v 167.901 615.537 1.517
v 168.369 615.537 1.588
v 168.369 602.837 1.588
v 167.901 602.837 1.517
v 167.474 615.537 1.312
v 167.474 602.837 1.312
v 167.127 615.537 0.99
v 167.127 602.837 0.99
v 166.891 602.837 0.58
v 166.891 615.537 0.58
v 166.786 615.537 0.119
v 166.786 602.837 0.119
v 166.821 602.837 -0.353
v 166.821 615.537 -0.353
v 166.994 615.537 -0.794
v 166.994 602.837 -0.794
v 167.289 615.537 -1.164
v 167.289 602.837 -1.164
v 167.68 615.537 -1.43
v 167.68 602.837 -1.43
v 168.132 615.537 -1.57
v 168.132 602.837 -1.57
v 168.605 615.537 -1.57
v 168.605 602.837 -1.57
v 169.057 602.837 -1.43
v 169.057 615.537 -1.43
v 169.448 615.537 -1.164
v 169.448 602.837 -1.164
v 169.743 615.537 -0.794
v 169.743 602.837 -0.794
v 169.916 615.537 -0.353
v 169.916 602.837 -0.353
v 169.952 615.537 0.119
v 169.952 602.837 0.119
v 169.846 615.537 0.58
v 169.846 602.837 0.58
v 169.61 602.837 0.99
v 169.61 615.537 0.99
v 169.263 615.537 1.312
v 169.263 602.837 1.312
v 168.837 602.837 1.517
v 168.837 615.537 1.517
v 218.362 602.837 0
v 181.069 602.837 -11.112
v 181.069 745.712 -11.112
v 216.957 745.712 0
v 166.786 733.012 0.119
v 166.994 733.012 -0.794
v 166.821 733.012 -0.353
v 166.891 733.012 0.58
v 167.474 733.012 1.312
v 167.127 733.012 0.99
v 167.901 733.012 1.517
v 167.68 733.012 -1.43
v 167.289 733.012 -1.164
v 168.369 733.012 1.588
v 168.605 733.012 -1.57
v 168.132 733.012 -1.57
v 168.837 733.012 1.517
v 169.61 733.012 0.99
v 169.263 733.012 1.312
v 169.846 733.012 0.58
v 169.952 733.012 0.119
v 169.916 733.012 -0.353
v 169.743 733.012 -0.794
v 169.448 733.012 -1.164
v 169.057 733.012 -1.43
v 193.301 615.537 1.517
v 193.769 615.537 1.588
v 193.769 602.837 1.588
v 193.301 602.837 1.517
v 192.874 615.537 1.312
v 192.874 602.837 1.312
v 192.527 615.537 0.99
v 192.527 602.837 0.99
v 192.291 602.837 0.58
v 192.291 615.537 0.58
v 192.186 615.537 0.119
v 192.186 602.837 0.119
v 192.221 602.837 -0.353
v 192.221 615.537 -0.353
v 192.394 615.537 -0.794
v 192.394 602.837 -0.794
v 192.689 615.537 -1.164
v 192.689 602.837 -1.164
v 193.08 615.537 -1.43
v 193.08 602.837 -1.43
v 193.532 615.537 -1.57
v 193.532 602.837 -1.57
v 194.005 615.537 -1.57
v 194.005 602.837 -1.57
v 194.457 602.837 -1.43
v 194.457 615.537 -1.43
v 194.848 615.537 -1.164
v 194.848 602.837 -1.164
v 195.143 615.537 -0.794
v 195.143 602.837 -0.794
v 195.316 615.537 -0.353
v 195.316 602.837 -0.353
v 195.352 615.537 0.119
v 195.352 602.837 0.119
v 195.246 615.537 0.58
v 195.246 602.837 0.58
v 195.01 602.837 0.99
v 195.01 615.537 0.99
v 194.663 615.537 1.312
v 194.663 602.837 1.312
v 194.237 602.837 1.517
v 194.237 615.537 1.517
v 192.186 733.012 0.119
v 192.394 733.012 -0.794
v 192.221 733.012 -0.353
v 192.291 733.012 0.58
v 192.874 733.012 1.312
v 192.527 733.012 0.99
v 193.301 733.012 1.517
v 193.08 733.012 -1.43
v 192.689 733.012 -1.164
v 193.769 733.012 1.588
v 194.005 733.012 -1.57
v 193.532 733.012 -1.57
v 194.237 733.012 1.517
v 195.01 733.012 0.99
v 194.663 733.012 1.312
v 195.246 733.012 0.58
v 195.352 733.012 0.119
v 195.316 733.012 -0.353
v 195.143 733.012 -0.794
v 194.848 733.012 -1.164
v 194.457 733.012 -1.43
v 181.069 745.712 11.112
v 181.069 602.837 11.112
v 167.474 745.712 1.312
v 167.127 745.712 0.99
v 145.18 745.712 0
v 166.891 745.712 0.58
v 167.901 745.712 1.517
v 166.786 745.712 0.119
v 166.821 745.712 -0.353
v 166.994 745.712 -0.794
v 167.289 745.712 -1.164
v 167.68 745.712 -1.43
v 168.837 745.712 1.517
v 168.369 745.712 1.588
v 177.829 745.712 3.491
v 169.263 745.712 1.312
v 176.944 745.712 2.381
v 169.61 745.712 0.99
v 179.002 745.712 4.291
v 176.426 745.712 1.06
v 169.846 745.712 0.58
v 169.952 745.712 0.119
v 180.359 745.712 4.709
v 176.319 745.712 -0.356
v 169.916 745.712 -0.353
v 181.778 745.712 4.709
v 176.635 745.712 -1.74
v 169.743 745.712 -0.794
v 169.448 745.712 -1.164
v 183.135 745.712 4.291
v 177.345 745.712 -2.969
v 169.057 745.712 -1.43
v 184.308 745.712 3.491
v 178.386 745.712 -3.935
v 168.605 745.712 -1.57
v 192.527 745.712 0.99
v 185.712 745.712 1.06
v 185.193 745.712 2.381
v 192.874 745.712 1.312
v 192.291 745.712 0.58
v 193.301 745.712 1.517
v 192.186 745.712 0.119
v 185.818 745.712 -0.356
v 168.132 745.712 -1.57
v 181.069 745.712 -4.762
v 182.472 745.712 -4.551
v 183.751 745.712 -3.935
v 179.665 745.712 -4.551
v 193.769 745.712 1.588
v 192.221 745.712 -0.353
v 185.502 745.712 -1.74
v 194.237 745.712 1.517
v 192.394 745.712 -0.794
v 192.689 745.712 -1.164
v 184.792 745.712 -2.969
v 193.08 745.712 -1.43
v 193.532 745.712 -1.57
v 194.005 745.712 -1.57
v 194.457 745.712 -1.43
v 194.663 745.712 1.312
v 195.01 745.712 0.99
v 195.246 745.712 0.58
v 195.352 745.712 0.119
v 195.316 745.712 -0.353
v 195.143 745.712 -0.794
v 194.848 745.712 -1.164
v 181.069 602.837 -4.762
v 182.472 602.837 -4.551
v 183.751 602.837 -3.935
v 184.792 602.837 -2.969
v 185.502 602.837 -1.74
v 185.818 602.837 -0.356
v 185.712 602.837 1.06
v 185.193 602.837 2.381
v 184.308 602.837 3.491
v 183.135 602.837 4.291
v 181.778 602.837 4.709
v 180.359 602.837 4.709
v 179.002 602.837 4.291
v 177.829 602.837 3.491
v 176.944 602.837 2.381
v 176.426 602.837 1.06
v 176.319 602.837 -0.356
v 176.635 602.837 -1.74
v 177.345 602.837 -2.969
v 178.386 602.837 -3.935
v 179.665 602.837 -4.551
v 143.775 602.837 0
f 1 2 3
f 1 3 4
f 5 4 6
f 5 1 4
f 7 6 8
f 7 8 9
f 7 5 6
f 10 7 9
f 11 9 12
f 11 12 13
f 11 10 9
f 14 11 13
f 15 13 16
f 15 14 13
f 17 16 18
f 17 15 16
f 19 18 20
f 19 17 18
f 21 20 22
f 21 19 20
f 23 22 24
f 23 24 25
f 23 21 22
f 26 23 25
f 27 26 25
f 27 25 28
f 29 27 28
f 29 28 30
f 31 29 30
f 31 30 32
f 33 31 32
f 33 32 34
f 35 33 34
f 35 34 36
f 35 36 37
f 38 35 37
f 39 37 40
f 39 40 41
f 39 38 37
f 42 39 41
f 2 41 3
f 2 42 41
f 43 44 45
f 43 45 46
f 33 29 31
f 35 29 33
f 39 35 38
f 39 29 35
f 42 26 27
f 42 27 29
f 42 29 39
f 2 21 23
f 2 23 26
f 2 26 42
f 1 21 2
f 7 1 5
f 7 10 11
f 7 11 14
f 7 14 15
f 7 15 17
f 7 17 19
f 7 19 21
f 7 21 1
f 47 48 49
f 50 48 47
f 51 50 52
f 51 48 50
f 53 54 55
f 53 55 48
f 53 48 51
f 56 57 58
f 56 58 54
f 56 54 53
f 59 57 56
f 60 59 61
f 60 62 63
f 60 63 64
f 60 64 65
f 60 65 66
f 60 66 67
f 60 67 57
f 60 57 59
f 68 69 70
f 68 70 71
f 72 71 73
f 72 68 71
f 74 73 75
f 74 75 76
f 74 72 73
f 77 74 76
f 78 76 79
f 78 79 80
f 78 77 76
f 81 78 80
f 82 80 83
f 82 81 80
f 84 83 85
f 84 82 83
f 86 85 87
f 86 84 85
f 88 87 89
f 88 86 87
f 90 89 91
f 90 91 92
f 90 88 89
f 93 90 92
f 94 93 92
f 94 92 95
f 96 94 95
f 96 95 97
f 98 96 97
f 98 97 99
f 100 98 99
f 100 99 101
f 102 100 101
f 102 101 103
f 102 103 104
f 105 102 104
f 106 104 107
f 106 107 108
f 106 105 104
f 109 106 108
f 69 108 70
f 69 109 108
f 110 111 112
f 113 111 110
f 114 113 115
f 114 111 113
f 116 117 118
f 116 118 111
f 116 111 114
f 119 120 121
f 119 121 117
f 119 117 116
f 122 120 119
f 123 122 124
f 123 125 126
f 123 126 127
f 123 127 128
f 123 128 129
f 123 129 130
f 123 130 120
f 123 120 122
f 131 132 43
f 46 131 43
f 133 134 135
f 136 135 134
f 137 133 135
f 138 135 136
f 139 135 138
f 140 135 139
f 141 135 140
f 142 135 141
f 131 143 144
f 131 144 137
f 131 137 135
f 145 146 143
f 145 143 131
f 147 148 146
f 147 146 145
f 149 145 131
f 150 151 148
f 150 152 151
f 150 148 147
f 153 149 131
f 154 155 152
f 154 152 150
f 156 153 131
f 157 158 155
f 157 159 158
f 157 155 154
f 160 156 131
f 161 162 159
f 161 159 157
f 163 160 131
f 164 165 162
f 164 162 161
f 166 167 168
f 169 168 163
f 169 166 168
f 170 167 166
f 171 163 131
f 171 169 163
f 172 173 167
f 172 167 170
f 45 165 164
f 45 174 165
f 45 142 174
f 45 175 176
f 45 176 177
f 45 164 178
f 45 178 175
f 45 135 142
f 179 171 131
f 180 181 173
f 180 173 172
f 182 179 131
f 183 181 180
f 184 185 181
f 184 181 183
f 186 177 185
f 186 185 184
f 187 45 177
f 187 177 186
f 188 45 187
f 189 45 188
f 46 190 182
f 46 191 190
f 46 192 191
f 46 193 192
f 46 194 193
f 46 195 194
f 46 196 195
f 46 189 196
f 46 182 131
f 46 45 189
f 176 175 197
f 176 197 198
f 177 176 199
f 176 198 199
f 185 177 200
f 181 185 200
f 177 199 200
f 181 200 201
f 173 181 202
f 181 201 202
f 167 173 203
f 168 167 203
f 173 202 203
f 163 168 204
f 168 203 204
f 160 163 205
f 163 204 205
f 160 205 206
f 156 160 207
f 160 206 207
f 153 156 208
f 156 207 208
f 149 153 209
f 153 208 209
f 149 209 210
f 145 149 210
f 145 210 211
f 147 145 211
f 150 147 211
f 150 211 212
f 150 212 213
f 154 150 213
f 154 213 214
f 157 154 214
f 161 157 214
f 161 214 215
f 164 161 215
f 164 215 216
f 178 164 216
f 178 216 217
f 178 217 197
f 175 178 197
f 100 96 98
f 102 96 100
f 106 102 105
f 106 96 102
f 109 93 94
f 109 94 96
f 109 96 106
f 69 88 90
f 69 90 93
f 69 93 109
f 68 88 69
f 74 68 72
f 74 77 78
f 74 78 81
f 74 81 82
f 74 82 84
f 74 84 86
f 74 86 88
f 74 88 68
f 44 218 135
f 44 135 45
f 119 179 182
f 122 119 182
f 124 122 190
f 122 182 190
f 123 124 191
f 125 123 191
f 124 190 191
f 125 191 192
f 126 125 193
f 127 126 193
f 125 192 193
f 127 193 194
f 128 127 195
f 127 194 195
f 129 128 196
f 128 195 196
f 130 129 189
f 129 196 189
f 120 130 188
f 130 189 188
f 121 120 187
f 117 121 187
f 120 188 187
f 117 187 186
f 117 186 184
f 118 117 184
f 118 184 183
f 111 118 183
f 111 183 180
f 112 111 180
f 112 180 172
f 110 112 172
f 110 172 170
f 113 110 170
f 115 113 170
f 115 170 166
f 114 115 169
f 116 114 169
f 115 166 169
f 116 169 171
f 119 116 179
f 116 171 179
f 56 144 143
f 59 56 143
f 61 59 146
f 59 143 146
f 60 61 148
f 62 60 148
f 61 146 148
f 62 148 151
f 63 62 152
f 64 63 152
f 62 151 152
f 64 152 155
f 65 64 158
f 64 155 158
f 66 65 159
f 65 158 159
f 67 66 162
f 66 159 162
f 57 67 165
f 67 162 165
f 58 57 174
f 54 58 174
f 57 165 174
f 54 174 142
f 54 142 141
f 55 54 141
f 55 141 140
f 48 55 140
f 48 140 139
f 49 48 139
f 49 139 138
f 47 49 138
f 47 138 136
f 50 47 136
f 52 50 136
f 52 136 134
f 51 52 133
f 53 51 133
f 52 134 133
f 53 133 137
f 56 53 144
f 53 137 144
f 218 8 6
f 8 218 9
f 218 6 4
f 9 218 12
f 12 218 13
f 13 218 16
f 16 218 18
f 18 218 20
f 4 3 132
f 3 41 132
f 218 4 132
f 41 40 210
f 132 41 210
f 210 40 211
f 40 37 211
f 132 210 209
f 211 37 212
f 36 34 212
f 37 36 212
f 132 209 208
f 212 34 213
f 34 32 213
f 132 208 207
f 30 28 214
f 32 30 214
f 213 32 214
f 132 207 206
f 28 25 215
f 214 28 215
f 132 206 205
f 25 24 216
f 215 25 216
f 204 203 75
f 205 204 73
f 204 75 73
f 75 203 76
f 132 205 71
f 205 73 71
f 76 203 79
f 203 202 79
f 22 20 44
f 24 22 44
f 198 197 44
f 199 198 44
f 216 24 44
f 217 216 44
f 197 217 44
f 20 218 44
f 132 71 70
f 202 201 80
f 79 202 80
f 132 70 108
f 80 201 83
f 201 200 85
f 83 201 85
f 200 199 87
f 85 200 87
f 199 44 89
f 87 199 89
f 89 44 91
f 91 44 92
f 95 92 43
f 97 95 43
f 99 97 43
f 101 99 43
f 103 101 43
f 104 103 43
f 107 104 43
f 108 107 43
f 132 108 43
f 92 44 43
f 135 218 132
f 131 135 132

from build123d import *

# Parameters (mm, degrees)
BOSS_EXTRUDE1_DEPTH      = 11.1125
BOSS_EXTRUDE1_DEPTH_BACK = 11.1125
SKETCH5_W                = 109.877468776
SKETCH5_H                = 283.051122129
CUT_EXTRUDE2_DEPTH       = 1193.492852366
SKETCH6_W                = 149.121482991
SKETCH6_H                = 108.921761737
CUT_EXTRUDE3_DEPTH       = 1175.662940665
SKETCH7_R                = 4.7625
CUT_EXTRUDE4_DEPTH       = 635
CUT_EXTRUDE8_DEPTH       = 1195.766301895
CUT_EXTRUDE8_DEPTH_BACK  = 1195.766301895
SKETCH8_W                = 149.774750394
SKETCH8_H                = 148.832770831
SKETCH8_H_2              = 142.875
SKETCH8_H_3              = 176.125878949
SKETCH11_R               = 1.5875
CUT_EXTRUDE9_DEPTH       = 12.7
CUT_EXTRUDE10_START      = -12.7
SKETCH12_R               = 1.5875
CUT_EXTRUDE10_DEPTH      = 12.7


with BuildPart() as part:
    # Sketch1 → Boss-Extrude1 (new, two sides: drawn at the far end of the back side and taken through both)
    with BuildSketch(Plane.XY.offset(-BOSS_EXTRUDE1_DEPTH_BACK)):
        Polygon((142.42123069, 465.168027231), (219.716026672, 465.168027231), (213.502471629, 1096.967634552), (181.068628681, 1174.337215652), (148.634785732, 1096.967634552), align=None)
    extrude(amount=BOSS_EXTRUDE1_DEPTH + BOSS_EXTRUDE1_DEPTH_BACK)

    # Sketch2 → Cut-Loft1 section 0
    with BuildSketch(Plane.XZ.offset(-465.168027231)):
        with BuildLine():
            Line((142.42123069, 0), (181.068628681, 11.1125))
            Line((181.068628681, 11.1125), (219.716026672, 0))
            Line((219.716026672, 0), (222.70513775, 0))
            Line((222.70513775, 0), (222.70513775, 15.258366339))
            Line((222.70513775, 15.258366339), (137.848628215, 15.258366339))
            Line((137.848628215, 15.258366339), (137.848628215, 0))
            Line((137.848628215, 0), (142.42123069, 0))
        make_face()
    # Sketch3 → Cut-Loft1 section 1
    with BuildSketch(Plane(origin=(0, 1096.967634552, 0), x_dir=(1, 0, 0), z_dir=(0, 1, 0))):
        with BuildLine():
            Line((213.502471629, 0), (181.068628681, -11.1125))
            Line((181.068628681, -11.1125), (148.634785732, 0))
            Line((148.634785732, 0), (137.848628215, 0))
            Line((137.848628215, 0), (137.848628215, -15.258366339))
            Line((137.848628215, -15.258366339), (222.70513775, -15.258366339))
            Line((222.70513775, -15.258366339), (222.70513775, 0))
            Line((222.70513775, 0), (213.502471629, 0))
        make_face()
    cut_loft1 = loft(mode=Mode.SUBTRACT)

    # Mirror1: Cut-Loft1 across plane
    add(cut_loft1.mirror(Plane.XY), mode=Mode.SUBTRACT)

    # Sketch5 → Cut-Extrude2 (cut, through all)
    with BuildSketch(Plane(origin=(-32.103098407, 13.457832356, 93.698704331), x_dir=(0.9470206004067627, 0.045661094409327196, 0.31791043842968925), z_dir=(-0.3211728232668741, 0.1346377834927197, 0.937401026696127))):
        with Locations((219.349244299, 1139.303724701)):
            Rectangle(SKETCH5_W, SKETCH5_H)
    cut_extrude2 = extrude(amount=CUT_EXTRUDE2_DEPTH, mode=Mode.SUBTRACT)

    # Sketch6 → Cut-Extrude3 (cut, through all)
    with BuildSketch(Plane(origin=(69.458274406, 29.117370568, 202.726547902), x_dir=(0.9470206004067623, -0.045661094409327495, -0.31791043842969063), z_dir=(0.3211728232668754, 0.13463778349272, 0.9374010266961263))):
        with Locations((131.752816965, 1118.922251835)):
            Rectangle(SKETCH6_W, SKETCH6_H)
    cut_extrude3 = extrude(amount=CUT_EXTRUDE3_DEPTH, mode=Mode.SUBTRACT)

    # Mirror2: Cut-Extrude2, Cut-Extrude3 across plane
    add(cut_extrude2.mirror(Plane.XY), mode=Mode.SUBTRACT)
    add(cut_extrude3.mirror(Plane.XY), mode=Mode.SUBTRACT)

    # Sketch7 → Cut-Extrude4 (cut)
    with BuildSketch(Plane.XZ.offset(-465.168027231)):
        with Locations(Location((181.068628681, 0, 0), (0, 0, 270))):
            Circle(SKETCH7_R)
    extrude(amount=-CUT_EXTRUDE4_DEPTH, mode=Mode.SUBTRACT)

    # Sketch8 → Cut-Extrude8 (cut, two sides: drawn at the far end of the back side and taken through both)
    with BuildSketch(Plane.XY.offset(-CUT_EXTRUDE8_DEPTH_BACK)):
        with Locations((180.5976389, 528.420830237)):
            Rectangle(SKETCH8_W, SKETCH8_H)
        with Locations((180.5976389, 817.149715652)):
            Rectangle(SKETCH8_W, SKETCH8_H_2)
        with Locations((180.5976389, 960.024715652)):
            Rectangle(SKETCH8_W, SKETCH8_H_2)
        with Locations((180.5976389, 1119.525155127)):
            Rectangle(SKETCH8_W, SKETCH8_H_3)
    extrude(amount=CUT_EXTRUDE8_DEPTH + CUT_EXTRUDE8_DEPTH_BACK, mode=Mode.SUBTRACT)

    # Sketch11 → Cut-Extrude9 (cut)
    with BuildSketch(Plane(origin=(0, 745.712215652, 0), x_dir=(1, 0, 0), z_dir=(0, 1, 0))):
        with Locations(Location((168.368628681, 0, 0), (0, 0, 270))):
            Circle(SKETCH11_R)
        with Locations(Location((193.768628681, 0, 0), (0, 0, 270))):
            Circle(SKETCH11_R)
    extrude(amount=-CUT_EXTRUDE9_DEPTH, mode=Mode.SUBTRACT)

    # Sketch12 → Cut-Extrude10 (cut)
    with BuildSketch(Plane.XZ.offset(-602.837215652).offset(CUT_EXTRUDE10_START)):
        with Locations(Location((168.368628681, 0, 0), (0, 0, 90))):
            Circle(SKETCH12_R)
        with Locations(Location((193.768628681, 0, 0), (0, 0, 90))):
            Circle(SKETCH12_R)
    extrude(amount=CUT_EXTRUDE10_DEPTH, mode=Mode.SUBTRACT)


solid = part.part
